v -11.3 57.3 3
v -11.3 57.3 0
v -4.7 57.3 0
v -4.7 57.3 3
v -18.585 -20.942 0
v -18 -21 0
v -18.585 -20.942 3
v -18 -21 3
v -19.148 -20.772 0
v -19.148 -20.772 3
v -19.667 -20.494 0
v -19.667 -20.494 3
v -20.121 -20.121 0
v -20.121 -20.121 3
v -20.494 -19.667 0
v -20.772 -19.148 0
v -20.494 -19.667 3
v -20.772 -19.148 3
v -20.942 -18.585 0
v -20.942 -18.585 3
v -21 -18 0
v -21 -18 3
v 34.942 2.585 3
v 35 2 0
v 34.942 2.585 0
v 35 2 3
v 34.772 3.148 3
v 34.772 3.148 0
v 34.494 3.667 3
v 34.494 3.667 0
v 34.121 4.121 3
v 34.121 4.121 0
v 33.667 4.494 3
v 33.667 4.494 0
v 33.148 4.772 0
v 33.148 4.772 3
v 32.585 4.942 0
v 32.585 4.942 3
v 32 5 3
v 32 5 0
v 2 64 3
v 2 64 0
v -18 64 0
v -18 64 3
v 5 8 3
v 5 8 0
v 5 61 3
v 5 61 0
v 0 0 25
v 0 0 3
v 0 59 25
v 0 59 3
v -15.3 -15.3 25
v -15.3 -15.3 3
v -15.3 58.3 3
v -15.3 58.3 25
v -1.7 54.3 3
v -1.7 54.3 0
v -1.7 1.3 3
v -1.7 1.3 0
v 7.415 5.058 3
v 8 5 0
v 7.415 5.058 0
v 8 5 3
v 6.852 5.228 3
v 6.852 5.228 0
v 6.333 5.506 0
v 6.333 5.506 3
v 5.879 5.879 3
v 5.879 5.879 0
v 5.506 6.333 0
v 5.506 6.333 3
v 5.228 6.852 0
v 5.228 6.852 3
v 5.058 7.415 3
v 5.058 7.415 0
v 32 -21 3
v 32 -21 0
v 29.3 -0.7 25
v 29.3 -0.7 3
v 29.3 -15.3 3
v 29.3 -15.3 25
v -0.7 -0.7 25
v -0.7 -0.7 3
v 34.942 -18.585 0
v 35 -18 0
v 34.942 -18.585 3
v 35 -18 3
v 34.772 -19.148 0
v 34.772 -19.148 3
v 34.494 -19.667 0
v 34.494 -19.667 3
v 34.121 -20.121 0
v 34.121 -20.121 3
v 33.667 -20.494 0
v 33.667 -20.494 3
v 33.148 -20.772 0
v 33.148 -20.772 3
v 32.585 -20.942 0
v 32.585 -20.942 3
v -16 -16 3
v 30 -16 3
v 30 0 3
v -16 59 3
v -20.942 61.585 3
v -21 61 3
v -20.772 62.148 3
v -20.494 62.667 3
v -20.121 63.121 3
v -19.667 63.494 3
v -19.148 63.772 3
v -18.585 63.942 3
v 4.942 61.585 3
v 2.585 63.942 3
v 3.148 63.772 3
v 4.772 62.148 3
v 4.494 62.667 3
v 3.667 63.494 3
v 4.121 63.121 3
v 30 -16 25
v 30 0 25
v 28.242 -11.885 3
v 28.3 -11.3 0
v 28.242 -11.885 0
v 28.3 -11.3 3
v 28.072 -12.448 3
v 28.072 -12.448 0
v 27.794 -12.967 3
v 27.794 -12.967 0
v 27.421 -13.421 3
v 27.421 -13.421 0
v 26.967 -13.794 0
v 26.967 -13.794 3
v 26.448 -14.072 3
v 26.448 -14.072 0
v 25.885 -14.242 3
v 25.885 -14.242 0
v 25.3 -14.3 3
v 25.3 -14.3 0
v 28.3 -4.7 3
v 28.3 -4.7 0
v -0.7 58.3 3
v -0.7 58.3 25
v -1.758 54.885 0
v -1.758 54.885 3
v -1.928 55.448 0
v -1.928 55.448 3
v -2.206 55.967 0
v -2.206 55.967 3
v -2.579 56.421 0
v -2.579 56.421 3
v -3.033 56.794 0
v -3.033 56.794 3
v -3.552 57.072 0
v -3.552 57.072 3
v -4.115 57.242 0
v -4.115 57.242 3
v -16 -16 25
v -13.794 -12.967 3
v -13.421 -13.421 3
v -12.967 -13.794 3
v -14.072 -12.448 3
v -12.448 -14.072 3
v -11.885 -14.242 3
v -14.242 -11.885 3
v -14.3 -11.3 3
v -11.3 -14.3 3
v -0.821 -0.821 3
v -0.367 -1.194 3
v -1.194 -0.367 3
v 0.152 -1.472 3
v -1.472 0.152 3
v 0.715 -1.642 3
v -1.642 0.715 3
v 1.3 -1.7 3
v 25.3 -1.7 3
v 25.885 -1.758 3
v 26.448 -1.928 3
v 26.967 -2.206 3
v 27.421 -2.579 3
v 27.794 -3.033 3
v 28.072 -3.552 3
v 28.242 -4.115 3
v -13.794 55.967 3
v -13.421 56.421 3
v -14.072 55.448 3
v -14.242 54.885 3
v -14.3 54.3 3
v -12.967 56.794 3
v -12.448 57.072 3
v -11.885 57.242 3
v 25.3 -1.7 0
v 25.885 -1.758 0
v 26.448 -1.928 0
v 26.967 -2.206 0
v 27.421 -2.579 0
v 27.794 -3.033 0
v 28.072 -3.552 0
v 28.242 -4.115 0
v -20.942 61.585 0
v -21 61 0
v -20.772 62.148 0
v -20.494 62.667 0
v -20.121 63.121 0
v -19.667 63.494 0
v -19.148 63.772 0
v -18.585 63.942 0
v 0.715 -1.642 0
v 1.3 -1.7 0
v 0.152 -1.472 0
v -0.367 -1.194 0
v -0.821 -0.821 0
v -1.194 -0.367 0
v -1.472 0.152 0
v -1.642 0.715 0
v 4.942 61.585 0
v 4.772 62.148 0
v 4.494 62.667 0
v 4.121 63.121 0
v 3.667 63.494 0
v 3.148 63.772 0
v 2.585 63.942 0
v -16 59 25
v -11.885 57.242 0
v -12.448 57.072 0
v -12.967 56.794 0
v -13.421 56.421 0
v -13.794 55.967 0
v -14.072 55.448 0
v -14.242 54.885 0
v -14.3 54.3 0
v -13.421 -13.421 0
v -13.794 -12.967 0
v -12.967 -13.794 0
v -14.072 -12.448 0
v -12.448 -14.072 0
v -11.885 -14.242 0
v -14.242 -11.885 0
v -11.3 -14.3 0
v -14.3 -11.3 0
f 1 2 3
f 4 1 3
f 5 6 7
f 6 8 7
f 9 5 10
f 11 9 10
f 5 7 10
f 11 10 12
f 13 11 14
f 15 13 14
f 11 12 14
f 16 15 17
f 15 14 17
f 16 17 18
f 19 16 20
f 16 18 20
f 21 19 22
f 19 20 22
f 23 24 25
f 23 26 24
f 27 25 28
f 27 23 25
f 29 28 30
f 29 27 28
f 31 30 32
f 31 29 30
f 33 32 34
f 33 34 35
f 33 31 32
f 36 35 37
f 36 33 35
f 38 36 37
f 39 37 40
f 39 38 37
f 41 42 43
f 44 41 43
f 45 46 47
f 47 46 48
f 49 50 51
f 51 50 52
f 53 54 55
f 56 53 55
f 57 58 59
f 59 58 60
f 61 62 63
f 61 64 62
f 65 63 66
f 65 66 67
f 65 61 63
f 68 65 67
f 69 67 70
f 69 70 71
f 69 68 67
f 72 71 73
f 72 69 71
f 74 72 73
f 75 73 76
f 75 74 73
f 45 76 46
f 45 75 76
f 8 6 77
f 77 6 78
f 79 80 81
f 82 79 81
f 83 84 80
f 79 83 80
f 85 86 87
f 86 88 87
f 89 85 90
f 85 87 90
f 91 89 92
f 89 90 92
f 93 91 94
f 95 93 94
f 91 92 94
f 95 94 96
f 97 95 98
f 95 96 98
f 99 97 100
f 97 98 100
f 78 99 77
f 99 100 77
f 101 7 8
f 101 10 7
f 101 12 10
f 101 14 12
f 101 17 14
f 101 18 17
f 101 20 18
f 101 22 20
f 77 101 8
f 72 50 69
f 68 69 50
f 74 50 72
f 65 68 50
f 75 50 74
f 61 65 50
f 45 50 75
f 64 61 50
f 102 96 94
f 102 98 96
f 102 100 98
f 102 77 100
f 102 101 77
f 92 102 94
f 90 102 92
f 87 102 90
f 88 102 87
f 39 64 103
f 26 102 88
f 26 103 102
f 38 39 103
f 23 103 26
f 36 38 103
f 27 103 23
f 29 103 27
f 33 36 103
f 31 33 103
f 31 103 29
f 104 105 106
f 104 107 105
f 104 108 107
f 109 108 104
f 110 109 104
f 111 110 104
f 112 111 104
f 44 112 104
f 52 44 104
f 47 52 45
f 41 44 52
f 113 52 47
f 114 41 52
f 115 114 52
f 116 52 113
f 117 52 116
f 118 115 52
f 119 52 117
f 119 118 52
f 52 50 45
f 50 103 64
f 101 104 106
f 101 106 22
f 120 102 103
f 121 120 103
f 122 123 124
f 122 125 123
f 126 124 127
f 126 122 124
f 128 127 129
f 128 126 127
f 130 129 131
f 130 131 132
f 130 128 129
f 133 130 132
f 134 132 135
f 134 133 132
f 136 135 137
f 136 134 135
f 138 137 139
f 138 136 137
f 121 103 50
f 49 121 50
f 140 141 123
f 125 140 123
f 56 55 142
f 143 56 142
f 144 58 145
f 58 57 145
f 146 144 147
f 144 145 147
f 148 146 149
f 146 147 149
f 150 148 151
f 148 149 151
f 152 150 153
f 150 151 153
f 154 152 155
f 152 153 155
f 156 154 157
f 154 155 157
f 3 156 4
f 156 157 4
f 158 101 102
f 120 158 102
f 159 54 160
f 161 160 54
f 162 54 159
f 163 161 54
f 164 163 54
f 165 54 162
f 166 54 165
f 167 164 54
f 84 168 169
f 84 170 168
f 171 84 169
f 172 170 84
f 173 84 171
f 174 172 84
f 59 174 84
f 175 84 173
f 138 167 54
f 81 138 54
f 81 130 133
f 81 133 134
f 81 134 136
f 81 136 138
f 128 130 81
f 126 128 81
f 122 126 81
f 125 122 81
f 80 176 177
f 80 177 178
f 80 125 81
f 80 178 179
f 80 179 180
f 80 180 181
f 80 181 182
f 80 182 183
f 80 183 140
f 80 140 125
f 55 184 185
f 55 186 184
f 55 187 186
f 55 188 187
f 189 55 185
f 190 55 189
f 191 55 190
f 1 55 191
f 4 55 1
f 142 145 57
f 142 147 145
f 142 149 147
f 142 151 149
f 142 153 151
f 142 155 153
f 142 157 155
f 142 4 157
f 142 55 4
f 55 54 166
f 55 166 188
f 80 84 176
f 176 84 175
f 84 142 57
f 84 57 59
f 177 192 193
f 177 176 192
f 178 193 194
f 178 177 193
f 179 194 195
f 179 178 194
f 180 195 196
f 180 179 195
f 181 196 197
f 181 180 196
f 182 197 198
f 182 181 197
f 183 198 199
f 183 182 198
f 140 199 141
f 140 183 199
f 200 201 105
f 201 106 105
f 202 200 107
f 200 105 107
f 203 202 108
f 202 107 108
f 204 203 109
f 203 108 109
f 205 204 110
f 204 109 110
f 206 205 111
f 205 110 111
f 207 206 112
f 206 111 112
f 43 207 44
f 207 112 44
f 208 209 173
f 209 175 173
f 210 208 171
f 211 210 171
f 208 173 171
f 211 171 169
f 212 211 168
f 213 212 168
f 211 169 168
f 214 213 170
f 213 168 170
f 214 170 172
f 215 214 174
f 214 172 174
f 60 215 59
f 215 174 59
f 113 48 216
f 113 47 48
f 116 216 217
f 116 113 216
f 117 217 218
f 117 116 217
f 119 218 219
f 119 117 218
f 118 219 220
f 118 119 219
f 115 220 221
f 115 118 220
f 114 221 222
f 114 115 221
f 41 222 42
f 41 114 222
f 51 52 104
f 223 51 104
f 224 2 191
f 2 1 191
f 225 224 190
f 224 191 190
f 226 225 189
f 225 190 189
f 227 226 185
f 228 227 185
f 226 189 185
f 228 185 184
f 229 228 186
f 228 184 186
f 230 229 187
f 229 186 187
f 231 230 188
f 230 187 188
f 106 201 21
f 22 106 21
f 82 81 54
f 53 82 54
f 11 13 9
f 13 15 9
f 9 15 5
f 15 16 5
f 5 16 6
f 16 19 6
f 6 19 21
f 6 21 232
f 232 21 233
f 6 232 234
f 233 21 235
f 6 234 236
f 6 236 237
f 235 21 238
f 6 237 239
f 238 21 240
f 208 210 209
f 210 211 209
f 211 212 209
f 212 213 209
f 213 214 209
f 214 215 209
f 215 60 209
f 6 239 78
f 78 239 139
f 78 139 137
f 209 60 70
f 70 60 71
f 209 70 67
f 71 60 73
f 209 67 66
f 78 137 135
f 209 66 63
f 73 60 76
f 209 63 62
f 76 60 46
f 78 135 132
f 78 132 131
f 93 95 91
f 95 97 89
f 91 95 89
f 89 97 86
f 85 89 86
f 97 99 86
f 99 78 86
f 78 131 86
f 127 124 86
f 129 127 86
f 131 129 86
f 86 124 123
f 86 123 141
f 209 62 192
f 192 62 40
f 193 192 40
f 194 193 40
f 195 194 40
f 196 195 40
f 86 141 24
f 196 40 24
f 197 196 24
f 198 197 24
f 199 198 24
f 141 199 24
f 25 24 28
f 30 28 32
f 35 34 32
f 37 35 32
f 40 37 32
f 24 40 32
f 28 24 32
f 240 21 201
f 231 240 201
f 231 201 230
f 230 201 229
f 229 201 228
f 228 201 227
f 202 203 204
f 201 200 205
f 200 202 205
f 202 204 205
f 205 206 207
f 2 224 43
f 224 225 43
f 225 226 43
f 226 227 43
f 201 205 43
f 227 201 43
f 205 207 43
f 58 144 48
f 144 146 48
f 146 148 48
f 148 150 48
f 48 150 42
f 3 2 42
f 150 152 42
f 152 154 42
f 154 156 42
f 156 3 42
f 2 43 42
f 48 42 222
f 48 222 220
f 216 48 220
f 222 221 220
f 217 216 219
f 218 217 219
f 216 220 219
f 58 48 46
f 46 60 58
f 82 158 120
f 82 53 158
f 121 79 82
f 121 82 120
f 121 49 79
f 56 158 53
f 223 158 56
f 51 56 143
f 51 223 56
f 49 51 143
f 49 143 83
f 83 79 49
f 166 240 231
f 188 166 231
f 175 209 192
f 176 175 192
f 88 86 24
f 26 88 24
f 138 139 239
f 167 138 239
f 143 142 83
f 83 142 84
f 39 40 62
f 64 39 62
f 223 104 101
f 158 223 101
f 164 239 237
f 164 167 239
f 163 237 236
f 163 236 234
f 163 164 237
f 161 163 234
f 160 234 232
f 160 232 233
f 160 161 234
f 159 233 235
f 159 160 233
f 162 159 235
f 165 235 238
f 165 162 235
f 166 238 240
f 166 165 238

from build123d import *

# Parameters (mm, degrees)
F1_DEPTH = 3
F2_DEPTH = 25
F3_R     = 3


with BuildPart() as f1:
    # F0 (on Top) → F1 (new body)
    with BuildSketch(Plane.XY):
        Polygon((34.9999997169, -20.9999997169), (34.9999997169, 4.9999997169), (4.9999997169, 4.9999997169), (4.9999997169, 63.9999997169), (-20.9999997169, 63.9999997169), (-20.9999997169, -20.9999997169), align=None)
        Polygon((0, 59), (0, 0), (30, 0), (30, -16), (-16, -16), (-16, 59), align=None, mode=Mode.SUBTRACT)
        Polygon((30, 0), (0, 0), (0, 59), (-16, 59), (-16, -16), (30, -16), align=None)
        Polygon((-15.3, 58.3), (-0.7, 58.3), (-0.7, -0.7), (29.3, -0.7), (29.3, -15.3), (-15.3, -15.3), align=None, mode=Mode.SUBTRACT)
        Polygon((-0.7, -0.7), (-0.7, 58.3), (-15.3, 58.3), (-15.3, -15.3), (29.3, -15.3), (29.3, -0.7), align=None)
        Polygon((28.3, -1.7), (28.3, -14.3), (-14.3, -14.3), (-14.3, 57.3), (-1.7, 57.3), (-1.7, -1.7), align=None, mode=Mode.SUBTRACT)
    extrude(amount=F1_DEPTH)

    # F0 (on Top) → F2 (join)
    with BuildSketch(Plane.XY):
        Polygon((30, 0), (0, 0), (0, 59), (-16, 59), (-16, -16), (30, -16), align=None)
        Polygon((-15.3, 58.3), (-0.7, 58.3), (-0.7, -0.7), (29.3, -0.7), (29.3, -15.3), (-15.3, -15.3), align=None, mode=Mode.SUBTRACT)
    extrude(amount=F2_DEPTH)

    # F3
    f3_edges = [f1.edges().sort_by_distance(p)[0] for p in [
        (35, -21, 1.5),
        (35, 5, 1.5),
        (5, 5, 1.5),
        (5, 64, 1.5),
        (-21, 64, 1.5),
        (-21, -21, 1.5),
        (-14.3, -14.3, 1.5),
        (-1.7, -1.7, 1.5),
        (28.3, -14.3, 1.5),
        (28.3, -1.7, 1.5),
        (-1.7, 57.3, 1.5),
        (-14.3, 57.3, 1.5),
    ]]
    fillet(f3_edges, radius=F3_R)


solid = f1.part
